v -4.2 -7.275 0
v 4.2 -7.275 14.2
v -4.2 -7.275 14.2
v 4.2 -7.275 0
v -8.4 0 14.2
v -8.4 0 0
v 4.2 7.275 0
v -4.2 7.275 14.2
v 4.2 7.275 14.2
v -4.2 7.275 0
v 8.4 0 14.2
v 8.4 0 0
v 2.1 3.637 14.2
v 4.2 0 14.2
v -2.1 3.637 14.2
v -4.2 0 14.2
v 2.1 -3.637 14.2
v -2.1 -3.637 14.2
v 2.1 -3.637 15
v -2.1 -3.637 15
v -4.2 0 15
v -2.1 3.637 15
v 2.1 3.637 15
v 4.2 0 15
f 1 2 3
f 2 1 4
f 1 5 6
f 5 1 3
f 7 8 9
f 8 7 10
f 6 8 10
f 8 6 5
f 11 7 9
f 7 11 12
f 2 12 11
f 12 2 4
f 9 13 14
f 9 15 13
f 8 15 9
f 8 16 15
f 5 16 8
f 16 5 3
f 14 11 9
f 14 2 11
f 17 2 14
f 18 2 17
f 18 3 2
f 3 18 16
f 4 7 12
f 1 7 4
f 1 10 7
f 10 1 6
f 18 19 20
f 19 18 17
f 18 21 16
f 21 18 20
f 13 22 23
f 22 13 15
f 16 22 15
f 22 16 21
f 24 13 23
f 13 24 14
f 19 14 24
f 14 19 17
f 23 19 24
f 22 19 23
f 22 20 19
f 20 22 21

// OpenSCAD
// file: ../cookie_cutter.scad
// Cookie cutter generator
// Pau Fernández <pauek@minidosis.org>
// GNU GPL v2

module dxf(file, layer, height) {
   orig = dxf_cross(file = file, layer = layer);
   echo("origin: ", orig);
   translate([-orig[0], -orig[1], 0])
      linear_extrude(height = height)
         import(file = file, layer = layer);
}

module needle(height, thin1, thin2) {
   union() {
      cylinder(r = thin1, h = height-0.8, $fn = 6);
      cylinder(r = thin2, h = height, $fn = 6);
   }
}

module wall(file, layer, height, thin) {
   difference() {
      minkowski() {
        dxf(file, layer, 0.01);
        cylinder(r = thin, h = height, $fn = 6);
      }
      translate([0, 0, -1]) dxf(file, layer, height + 2);
   }
}

module cutter(file, layer, height, nozzle_diameter) {
   thin1 = nozzle_diameter * 2.4;
   thin2 = nozzle_diameter * 1.2;
   difference() {
      minkowski() {
        dxf(file, layer, 0.01);
        needle(height, thin1, thin2);
      }
      translate([0, 0, -1]) dxf(file, layer, height + 2);
   }
}

module cookie_cutter(file, height, join_height, nozzle_diameter) {
   union () {
      cutter(file, "cutter", height, nozzle_diameter);
      wall(file, "outer", 1, 5);
   }
}

module cookie_cutter_join(file, height, nozzle_diameter) {
   mirror([1, 0, 0]) union () {
      cutter(file, "cutter", height, nozzle_diameter);
      wall(file, "outer", 1.5, 5);
      dxf(file, "join", 1.5);
   }
}
// main file
include <../cookie_cutter.scad>;
cookie_cutter_join("E.dxf", 15, 3.5, 0.4);
